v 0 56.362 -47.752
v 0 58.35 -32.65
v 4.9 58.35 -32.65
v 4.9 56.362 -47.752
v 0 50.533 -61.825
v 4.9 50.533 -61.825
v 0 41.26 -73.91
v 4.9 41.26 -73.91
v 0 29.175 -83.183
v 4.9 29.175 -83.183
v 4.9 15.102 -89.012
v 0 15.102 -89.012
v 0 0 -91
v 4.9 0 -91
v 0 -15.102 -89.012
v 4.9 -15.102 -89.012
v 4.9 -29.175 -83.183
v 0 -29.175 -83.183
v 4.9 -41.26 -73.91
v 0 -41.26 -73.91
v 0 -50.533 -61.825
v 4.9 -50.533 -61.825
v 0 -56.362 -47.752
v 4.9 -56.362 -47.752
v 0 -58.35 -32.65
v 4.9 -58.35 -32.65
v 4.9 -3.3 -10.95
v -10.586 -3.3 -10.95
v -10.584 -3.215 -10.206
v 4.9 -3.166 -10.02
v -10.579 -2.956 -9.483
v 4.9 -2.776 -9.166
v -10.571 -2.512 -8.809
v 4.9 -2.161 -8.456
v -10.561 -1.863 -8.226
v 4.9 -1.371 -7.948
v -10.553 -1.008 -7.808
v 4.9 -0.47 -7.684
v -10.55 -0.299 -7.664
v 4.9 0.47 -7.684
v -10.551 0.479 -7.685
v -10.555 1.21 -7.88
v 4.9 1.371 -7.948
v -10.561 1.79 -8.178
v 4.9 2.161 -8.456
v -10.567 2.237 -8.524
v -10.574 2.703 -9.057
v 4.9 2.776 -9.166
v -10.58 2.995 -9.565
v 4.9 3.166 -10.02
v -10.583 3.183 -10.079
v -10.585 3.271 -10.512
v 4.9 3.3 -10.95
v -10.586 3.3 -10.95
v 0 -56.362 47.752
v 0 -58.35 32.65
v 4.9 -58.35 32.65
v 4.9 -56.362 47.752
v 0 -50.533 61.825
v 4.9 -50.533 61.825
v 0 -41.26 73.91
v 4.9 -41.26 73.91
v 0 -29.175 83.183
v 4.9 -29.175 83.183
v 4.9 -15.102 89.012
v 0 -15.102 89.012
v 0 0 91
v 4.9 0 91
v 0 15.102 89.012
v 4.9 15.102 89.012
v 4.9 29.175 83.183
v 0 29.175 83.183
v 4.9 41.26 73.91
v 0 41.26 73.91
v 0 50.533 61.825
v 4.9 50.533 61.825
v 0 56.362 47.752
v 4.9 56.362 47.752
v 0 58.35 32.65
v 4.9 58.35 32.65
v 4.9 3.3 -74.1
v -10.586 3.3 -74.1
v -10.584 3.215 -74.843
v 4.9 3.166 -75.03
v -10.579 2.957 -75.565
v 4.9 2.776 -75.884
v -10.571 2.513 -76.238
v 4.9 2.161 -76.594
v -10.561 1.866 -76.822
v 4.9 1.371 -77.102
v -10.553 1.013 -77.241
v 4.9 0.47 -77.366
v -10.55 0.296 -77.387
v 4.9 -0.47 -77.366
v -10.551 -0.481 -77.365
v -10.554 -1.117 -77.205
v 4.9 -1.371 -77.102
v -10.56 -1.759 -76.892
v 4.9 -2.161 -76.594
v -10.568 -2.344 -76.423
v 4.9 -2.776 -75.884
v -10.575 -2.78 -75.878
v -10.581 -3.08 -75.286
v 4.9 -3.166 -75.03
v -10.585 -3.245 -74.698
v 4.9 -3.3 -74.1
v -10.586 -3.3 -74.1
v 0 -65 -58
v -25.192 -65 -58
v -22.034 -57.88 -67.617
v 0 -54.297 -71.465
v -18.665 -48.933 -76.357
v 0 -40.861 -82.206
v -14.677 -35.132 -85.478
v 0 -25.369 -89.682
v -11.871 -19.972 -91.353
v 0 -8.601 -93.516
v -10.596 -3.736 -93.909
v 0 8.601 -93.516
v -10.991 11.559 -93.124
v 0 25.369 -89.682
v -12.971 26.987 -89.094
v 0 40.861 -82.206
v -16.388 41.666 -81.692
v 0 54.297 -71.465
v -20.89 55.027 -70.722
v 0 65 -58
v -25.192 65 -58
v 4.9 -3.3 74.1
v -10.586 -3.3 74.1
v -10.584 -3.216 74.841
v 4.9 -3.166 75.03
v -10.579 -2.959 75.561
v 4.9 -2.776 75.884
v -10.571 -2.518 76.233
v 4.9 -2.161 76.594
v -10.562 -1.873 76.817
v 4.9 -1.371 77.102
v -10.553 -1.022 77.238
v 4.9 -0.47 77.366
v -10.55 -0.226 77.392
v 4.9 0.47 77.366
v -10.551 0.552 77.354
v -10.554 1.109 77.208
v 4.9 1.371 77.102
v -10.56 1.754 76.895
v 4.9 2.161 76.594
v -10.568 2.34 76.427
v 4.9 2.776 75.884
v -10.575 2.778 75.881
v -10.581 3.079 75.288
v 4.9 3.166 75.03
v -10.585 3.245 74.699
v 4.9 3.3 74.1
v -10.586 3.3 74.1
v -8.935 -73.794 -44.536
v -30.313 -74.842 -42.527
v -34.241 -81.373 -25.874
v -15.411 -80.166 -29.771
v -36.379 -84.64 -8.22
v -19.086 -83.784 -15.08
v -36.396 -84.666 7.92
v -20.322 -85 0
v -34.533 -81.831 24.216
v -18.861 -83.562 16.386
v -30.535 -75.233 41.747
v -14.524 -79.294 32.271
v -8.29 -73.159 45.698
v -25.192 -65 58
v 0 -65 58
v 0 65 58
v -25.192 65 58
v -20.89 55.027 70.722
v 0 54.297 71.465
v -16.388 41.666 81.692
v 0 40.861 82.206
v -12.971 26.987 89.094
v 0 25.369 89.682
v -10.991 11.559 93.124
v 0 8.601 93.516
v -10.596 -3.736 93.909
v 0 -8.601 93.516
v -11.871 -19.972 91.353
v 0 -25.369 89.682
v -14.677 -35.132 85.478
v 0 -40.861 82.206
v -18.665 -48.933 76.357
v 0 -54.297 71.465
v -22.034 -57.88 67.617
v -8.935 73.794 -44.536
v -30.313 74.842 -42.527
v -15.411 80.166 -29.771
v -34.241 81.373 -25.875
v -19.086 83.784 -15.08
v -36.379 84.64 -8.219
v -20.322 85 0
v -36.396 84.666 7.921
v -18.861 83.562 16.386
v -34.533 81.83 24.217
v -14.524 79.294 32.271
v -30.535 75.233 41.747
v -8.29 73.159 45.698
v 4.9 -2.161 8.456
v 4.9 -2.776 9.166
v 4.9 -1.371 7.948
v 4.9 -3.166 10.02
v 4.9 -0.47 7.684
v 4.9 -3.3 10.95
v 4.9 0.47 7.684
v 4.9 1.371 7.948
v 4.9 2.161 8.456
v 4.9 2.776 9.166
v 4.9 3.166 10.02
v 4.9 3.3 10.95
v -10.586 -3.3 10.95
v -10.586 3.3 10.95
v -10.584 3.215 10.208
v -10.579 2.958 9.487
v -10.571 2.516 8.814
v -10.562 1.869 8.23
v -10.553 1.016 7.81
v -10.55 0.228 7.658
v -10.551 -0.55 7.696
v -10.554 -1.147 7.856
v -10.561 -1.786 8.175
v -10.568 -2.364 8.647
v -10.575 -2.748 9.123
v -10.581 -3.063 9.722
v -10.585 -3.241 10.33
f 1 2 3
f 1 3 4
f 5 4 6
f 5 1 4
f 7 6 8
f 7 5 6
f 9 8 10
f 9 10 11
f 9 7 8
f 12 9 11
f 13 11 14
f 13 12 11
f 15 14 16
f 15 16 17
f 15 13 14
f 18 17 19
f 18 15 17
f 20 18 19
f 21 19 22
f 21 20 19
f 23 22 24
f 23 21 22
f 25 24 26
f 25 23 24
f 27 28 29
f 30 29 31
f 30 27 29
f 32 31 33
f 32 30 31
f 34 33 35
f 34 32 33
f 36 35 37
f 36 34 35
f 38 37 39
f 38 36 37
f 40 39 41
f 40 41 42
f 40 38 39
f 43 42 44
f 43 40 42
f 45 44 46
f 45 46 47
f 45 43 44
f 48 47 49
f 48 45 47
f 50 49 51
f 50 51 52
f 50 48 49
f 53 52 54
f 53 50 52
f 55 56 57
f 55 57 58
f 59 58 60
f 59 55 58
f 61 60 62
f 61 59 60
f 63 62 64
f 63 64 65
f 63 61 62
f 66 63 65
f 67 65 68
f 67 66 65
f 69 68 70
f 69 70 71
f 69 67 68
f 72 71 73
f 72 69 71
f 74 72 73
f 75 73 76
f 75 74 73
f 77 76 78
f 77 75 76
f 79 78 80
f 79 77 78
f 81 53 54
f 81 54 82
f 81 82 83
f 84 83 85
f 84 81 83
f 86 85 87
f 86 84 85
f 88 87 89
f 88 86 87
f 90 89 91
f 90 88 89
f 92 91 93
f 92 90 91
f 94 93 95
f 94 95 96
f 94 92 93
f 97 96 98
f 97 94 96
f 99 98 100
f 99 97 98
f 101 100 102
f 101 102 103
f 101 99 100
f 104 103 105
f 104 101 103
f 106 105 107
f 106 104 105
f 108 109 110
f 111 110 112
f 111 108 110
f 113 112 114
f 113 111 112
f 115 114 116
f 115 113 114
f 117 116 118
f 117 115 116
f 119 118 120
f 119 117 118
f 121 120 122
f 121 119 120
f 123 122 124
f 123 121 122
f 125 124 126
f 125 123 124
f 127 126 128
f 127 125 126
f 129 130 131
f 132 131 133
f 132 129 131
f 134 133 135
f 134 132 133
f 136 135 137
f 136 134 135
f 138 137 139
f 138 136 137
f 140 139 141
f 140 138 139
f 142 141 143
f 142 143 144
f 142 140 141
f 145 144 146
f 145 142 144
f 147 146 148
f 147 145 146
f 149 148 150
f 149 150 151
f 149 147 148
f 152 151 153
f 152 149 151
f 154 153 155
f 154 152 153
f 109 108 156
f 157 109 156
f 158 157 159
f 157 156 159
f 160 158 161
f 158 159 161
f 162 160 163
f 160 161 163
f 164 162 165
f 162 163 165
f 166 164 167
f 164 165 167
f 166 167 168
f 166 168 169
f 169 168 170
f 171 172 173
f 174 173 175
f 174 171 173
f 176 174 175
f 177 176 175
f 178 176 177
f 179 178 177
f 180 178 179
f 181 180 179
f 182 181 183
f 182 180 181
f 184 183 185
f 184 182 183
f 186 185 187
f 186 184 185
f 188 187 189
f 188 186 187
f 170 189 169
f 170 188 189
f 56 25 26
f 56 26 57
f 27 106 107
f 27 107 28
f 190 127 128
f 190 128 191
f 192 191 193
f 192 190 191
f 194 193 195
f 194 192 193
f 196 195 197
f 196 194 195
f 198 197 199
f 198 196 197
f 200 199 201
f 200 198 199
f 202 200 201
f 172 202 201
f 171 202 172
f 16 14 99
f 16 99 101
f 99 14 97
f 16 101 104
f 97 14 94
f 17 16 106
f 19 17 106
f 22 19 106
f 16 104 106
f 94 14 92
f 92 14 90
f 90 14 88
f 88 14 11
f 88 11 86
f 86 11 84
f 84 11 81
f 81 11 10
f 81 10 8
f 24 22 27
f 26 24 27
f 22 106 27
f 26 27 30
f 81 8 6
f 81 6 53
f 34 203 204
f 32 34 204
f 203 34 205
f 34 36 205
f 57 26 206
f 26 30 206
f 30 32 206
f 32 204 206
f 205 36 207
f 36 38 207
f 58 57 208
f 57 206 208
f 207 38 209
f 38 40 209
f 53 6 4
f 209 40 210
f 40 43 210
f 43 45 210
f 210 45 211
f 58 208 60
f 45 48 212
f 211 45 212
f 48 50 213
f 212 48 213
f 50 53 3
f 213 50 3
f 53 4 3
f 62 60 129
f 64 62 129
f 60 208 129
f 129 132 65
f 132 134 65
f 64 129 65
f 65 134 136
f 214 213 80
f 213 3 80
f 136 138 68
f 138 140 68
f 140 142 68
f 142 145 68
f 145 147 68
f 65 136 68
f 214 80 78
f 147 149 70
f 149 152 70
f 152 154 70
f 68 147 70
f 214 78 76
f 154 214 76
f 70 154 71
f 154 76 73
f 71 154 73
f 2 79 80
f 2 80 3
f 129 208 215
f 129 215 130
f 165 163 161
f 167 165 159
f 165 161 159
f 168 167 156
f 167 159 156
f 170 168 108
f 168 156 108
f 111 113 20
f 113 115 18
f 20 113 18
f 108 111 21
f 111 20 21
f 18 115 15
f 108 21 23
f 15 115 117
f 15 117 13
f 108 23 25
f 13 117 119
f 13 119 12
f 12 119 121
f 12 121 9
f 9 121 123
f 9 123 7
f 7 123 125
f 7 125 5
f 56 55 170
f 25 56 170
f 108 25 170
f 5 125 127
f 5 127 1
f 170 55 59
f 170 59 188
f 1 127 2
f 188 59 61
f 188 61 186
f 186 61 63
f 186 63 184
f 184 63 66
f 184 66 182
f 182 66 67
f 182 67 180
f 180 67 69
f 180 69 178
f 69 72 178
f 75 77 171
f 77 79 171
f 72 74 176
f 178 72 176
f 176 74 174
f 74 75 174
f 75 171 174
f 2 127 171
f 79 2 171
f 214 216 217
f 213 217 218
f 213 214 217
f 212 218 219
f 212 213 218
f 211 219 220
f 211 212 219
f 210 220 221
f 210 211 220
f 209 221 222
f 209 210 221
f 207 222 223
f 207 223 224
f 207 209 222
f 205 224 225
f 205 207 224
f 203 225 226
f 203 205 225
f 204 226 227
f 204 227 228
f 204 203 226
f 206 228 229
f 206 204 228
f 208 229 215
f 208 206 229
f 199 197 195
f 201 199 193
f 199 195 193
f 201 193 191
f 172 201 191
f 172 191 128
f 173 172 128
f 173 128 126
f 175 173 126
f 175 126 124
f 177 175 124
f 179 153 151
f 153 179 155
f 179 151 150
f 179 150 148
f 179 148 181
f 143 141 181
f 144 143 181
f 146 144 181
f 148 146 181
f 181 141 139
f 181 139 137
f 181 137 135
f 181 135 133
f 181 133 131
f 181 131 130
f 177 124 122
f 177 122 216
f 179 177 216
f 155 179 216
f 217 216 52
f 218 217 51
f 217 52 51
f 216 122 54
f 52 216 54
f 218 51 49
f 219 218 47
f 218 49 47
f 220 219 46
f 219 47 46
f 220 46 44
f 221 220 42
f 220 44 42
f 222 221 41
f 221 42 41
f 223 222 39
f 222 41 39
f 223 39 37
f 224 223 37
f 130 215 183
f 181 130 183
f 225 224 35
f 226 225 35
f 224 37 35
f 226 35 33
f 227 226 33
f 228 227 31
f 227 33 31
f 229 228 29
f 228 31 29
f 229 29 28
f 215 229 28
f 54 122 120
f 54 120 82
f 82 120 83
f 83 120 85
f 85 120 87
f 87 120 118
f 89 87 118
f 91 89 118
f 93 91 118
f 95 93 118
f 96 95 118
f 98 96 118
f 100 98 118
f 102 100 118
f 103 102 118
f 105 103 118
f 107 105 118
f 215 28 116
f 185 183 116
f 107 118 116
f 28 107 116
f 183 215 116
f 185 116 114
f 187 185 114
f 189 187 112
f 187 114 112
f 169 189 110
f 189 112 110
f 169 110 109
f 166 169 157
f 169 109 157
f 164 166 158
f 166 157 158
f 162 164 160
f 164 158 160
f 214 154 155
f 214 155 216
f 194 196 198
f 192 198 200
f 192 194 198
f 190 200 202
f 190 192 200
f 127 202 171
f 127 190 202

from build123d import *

# Parameters (mm, degrees)
BOSS_EXTRUDE1_DEPTH = 4.9
BOSS_EXTRUDE2_DEPTH = 35
CUT_EXTRUDE1_DEPTH  = 122.049617926
BOSS_EXTRUDE3_DEPTH = 40
SKETCH4_R           = 151.595087716
CUT_EXTRUDE2_DEPTH  = 211.164221503
CUT_EXTRUDE3_DEPTH  = 210.547521178


with BuildPart() as part:
    # Sketch1 → Boss-Extrude1 (new body)
    with BuildSketch(Plane(origin=(0, 0, 0), x_dir=(0, 0, -1), z_dir=(1, 0, 0))):
        with BuildLine():
            Line((-32.65, 58.35), (32.65, 58.35))
            ThreePointArc((32.65, 58.35), (91, 0), (32.65, -58.35))
            Line((32.65, -58.35), (-32.65, -58.35))
            ThreePointArc((-32.65, -58.35), (-91, 0), (-32.65, 58.35))
        make_face()
    extrude(amount=BOSS_EXTRUDE1_DEPTH)

    # Sketch3 → Boss-Extrude2 (add)
    with BuildSketch(Plane.ZY):
        with BuildLine():
            Line((-58, 65), (58, 65))
            ThreePointArc((58, 65), (94, 0), (58, -65))
            Line((58, -65), (-58, -65))
            ThreePointArc((-58, -65), (-94, 0), (-58, 65))
        make_face()
    extrude(amount=BOSS_EXTRUDE2_DEPTH)

    # Sketch2 → Cut-Extrude1 (cut, through all)
    with BuildSketch(Plane(origin=(4.9, 0, 0), x_dir=(0, 0, -1), z_dir=(1, 0, 0))):
        with BuildLine():
            Line((-10.95, -3.3), (-74.1, -3.3))
            ThreePointArc((-74.1, -3.3), (-77.4, 0), (-74.1, 3.3))
            Line((-74.1, 3.3), (-10.95, 3.3))
            ThreePointArc((-10.95, 3.3), (-7.65, 0), (-10.95, -3.3))
        make_face()
        with BuildLine():
            Line((10.95, 3.3), (74.1, 3.3))
            ThreePointArc((74.1, 3.3), (77.4, 0), (74.1, -3.3))
            Line((74.1, -3.3), (10.95, -3.3))
            ThreePointArc((10.95, -3.3), (7.65, 0), (10.95, 3.3))
        make_face()
    extrude(amount=-CUT_EXTRUDE1_DEPTH, mode=Mode.SUBTRACT)

    # Sketch5 → Boss-Extrude3 (add)
    with BuildSketch(Plane(origin=(0, -65, -58), x_dir=(0, 0, -1), z_dir=(1, 0, 0))):
        with BuildLine():
            Line((-116, 0), (0, 0))
            ThreePointArc((0, 0), (-58, -20), (-116, 0))
        make_face()
        with BuildLine():
            Line((-116, 130), (0, 130))
            ThreePointArc((0, 130), (-58, 150), (-116, 130))
        make_face()
    extrude(amount=-BOSS_EXTRUDE3_DEPTH)

    # Sketch4 → Cut-Extrude2 (cut, through all)
    with BuildSketch(Plane(origin=(0, 0, -94), x_dir=(-1, 0, 0), z_dir=(0, 0, -1))):
        with Locations((162.145087716, 0)):
            Circle(SKETCH4_R)
    extrude(amount=-CUT_EXTRUDE2_DEPTH, mode=Mode.SUBTRACT)

    # Sketch8 → Cut-Extrude3 (cut, through all)
    with BuildSketch(Plane(origin=(0, 0, -94), x_dir=(-1, 0, 0), z_dir=(0, 0, -1))):
        Polygon((0, 65), (0, 85), (20.321882247, 85), align=None)
        Polygon((0, -65), (0, -85), (20.321882247, -85), align=None)
    extrude(amount=-CUT_EXTRUDE3_DEPTH, mode=Mode.SUBTRACT)


solid = part.part
